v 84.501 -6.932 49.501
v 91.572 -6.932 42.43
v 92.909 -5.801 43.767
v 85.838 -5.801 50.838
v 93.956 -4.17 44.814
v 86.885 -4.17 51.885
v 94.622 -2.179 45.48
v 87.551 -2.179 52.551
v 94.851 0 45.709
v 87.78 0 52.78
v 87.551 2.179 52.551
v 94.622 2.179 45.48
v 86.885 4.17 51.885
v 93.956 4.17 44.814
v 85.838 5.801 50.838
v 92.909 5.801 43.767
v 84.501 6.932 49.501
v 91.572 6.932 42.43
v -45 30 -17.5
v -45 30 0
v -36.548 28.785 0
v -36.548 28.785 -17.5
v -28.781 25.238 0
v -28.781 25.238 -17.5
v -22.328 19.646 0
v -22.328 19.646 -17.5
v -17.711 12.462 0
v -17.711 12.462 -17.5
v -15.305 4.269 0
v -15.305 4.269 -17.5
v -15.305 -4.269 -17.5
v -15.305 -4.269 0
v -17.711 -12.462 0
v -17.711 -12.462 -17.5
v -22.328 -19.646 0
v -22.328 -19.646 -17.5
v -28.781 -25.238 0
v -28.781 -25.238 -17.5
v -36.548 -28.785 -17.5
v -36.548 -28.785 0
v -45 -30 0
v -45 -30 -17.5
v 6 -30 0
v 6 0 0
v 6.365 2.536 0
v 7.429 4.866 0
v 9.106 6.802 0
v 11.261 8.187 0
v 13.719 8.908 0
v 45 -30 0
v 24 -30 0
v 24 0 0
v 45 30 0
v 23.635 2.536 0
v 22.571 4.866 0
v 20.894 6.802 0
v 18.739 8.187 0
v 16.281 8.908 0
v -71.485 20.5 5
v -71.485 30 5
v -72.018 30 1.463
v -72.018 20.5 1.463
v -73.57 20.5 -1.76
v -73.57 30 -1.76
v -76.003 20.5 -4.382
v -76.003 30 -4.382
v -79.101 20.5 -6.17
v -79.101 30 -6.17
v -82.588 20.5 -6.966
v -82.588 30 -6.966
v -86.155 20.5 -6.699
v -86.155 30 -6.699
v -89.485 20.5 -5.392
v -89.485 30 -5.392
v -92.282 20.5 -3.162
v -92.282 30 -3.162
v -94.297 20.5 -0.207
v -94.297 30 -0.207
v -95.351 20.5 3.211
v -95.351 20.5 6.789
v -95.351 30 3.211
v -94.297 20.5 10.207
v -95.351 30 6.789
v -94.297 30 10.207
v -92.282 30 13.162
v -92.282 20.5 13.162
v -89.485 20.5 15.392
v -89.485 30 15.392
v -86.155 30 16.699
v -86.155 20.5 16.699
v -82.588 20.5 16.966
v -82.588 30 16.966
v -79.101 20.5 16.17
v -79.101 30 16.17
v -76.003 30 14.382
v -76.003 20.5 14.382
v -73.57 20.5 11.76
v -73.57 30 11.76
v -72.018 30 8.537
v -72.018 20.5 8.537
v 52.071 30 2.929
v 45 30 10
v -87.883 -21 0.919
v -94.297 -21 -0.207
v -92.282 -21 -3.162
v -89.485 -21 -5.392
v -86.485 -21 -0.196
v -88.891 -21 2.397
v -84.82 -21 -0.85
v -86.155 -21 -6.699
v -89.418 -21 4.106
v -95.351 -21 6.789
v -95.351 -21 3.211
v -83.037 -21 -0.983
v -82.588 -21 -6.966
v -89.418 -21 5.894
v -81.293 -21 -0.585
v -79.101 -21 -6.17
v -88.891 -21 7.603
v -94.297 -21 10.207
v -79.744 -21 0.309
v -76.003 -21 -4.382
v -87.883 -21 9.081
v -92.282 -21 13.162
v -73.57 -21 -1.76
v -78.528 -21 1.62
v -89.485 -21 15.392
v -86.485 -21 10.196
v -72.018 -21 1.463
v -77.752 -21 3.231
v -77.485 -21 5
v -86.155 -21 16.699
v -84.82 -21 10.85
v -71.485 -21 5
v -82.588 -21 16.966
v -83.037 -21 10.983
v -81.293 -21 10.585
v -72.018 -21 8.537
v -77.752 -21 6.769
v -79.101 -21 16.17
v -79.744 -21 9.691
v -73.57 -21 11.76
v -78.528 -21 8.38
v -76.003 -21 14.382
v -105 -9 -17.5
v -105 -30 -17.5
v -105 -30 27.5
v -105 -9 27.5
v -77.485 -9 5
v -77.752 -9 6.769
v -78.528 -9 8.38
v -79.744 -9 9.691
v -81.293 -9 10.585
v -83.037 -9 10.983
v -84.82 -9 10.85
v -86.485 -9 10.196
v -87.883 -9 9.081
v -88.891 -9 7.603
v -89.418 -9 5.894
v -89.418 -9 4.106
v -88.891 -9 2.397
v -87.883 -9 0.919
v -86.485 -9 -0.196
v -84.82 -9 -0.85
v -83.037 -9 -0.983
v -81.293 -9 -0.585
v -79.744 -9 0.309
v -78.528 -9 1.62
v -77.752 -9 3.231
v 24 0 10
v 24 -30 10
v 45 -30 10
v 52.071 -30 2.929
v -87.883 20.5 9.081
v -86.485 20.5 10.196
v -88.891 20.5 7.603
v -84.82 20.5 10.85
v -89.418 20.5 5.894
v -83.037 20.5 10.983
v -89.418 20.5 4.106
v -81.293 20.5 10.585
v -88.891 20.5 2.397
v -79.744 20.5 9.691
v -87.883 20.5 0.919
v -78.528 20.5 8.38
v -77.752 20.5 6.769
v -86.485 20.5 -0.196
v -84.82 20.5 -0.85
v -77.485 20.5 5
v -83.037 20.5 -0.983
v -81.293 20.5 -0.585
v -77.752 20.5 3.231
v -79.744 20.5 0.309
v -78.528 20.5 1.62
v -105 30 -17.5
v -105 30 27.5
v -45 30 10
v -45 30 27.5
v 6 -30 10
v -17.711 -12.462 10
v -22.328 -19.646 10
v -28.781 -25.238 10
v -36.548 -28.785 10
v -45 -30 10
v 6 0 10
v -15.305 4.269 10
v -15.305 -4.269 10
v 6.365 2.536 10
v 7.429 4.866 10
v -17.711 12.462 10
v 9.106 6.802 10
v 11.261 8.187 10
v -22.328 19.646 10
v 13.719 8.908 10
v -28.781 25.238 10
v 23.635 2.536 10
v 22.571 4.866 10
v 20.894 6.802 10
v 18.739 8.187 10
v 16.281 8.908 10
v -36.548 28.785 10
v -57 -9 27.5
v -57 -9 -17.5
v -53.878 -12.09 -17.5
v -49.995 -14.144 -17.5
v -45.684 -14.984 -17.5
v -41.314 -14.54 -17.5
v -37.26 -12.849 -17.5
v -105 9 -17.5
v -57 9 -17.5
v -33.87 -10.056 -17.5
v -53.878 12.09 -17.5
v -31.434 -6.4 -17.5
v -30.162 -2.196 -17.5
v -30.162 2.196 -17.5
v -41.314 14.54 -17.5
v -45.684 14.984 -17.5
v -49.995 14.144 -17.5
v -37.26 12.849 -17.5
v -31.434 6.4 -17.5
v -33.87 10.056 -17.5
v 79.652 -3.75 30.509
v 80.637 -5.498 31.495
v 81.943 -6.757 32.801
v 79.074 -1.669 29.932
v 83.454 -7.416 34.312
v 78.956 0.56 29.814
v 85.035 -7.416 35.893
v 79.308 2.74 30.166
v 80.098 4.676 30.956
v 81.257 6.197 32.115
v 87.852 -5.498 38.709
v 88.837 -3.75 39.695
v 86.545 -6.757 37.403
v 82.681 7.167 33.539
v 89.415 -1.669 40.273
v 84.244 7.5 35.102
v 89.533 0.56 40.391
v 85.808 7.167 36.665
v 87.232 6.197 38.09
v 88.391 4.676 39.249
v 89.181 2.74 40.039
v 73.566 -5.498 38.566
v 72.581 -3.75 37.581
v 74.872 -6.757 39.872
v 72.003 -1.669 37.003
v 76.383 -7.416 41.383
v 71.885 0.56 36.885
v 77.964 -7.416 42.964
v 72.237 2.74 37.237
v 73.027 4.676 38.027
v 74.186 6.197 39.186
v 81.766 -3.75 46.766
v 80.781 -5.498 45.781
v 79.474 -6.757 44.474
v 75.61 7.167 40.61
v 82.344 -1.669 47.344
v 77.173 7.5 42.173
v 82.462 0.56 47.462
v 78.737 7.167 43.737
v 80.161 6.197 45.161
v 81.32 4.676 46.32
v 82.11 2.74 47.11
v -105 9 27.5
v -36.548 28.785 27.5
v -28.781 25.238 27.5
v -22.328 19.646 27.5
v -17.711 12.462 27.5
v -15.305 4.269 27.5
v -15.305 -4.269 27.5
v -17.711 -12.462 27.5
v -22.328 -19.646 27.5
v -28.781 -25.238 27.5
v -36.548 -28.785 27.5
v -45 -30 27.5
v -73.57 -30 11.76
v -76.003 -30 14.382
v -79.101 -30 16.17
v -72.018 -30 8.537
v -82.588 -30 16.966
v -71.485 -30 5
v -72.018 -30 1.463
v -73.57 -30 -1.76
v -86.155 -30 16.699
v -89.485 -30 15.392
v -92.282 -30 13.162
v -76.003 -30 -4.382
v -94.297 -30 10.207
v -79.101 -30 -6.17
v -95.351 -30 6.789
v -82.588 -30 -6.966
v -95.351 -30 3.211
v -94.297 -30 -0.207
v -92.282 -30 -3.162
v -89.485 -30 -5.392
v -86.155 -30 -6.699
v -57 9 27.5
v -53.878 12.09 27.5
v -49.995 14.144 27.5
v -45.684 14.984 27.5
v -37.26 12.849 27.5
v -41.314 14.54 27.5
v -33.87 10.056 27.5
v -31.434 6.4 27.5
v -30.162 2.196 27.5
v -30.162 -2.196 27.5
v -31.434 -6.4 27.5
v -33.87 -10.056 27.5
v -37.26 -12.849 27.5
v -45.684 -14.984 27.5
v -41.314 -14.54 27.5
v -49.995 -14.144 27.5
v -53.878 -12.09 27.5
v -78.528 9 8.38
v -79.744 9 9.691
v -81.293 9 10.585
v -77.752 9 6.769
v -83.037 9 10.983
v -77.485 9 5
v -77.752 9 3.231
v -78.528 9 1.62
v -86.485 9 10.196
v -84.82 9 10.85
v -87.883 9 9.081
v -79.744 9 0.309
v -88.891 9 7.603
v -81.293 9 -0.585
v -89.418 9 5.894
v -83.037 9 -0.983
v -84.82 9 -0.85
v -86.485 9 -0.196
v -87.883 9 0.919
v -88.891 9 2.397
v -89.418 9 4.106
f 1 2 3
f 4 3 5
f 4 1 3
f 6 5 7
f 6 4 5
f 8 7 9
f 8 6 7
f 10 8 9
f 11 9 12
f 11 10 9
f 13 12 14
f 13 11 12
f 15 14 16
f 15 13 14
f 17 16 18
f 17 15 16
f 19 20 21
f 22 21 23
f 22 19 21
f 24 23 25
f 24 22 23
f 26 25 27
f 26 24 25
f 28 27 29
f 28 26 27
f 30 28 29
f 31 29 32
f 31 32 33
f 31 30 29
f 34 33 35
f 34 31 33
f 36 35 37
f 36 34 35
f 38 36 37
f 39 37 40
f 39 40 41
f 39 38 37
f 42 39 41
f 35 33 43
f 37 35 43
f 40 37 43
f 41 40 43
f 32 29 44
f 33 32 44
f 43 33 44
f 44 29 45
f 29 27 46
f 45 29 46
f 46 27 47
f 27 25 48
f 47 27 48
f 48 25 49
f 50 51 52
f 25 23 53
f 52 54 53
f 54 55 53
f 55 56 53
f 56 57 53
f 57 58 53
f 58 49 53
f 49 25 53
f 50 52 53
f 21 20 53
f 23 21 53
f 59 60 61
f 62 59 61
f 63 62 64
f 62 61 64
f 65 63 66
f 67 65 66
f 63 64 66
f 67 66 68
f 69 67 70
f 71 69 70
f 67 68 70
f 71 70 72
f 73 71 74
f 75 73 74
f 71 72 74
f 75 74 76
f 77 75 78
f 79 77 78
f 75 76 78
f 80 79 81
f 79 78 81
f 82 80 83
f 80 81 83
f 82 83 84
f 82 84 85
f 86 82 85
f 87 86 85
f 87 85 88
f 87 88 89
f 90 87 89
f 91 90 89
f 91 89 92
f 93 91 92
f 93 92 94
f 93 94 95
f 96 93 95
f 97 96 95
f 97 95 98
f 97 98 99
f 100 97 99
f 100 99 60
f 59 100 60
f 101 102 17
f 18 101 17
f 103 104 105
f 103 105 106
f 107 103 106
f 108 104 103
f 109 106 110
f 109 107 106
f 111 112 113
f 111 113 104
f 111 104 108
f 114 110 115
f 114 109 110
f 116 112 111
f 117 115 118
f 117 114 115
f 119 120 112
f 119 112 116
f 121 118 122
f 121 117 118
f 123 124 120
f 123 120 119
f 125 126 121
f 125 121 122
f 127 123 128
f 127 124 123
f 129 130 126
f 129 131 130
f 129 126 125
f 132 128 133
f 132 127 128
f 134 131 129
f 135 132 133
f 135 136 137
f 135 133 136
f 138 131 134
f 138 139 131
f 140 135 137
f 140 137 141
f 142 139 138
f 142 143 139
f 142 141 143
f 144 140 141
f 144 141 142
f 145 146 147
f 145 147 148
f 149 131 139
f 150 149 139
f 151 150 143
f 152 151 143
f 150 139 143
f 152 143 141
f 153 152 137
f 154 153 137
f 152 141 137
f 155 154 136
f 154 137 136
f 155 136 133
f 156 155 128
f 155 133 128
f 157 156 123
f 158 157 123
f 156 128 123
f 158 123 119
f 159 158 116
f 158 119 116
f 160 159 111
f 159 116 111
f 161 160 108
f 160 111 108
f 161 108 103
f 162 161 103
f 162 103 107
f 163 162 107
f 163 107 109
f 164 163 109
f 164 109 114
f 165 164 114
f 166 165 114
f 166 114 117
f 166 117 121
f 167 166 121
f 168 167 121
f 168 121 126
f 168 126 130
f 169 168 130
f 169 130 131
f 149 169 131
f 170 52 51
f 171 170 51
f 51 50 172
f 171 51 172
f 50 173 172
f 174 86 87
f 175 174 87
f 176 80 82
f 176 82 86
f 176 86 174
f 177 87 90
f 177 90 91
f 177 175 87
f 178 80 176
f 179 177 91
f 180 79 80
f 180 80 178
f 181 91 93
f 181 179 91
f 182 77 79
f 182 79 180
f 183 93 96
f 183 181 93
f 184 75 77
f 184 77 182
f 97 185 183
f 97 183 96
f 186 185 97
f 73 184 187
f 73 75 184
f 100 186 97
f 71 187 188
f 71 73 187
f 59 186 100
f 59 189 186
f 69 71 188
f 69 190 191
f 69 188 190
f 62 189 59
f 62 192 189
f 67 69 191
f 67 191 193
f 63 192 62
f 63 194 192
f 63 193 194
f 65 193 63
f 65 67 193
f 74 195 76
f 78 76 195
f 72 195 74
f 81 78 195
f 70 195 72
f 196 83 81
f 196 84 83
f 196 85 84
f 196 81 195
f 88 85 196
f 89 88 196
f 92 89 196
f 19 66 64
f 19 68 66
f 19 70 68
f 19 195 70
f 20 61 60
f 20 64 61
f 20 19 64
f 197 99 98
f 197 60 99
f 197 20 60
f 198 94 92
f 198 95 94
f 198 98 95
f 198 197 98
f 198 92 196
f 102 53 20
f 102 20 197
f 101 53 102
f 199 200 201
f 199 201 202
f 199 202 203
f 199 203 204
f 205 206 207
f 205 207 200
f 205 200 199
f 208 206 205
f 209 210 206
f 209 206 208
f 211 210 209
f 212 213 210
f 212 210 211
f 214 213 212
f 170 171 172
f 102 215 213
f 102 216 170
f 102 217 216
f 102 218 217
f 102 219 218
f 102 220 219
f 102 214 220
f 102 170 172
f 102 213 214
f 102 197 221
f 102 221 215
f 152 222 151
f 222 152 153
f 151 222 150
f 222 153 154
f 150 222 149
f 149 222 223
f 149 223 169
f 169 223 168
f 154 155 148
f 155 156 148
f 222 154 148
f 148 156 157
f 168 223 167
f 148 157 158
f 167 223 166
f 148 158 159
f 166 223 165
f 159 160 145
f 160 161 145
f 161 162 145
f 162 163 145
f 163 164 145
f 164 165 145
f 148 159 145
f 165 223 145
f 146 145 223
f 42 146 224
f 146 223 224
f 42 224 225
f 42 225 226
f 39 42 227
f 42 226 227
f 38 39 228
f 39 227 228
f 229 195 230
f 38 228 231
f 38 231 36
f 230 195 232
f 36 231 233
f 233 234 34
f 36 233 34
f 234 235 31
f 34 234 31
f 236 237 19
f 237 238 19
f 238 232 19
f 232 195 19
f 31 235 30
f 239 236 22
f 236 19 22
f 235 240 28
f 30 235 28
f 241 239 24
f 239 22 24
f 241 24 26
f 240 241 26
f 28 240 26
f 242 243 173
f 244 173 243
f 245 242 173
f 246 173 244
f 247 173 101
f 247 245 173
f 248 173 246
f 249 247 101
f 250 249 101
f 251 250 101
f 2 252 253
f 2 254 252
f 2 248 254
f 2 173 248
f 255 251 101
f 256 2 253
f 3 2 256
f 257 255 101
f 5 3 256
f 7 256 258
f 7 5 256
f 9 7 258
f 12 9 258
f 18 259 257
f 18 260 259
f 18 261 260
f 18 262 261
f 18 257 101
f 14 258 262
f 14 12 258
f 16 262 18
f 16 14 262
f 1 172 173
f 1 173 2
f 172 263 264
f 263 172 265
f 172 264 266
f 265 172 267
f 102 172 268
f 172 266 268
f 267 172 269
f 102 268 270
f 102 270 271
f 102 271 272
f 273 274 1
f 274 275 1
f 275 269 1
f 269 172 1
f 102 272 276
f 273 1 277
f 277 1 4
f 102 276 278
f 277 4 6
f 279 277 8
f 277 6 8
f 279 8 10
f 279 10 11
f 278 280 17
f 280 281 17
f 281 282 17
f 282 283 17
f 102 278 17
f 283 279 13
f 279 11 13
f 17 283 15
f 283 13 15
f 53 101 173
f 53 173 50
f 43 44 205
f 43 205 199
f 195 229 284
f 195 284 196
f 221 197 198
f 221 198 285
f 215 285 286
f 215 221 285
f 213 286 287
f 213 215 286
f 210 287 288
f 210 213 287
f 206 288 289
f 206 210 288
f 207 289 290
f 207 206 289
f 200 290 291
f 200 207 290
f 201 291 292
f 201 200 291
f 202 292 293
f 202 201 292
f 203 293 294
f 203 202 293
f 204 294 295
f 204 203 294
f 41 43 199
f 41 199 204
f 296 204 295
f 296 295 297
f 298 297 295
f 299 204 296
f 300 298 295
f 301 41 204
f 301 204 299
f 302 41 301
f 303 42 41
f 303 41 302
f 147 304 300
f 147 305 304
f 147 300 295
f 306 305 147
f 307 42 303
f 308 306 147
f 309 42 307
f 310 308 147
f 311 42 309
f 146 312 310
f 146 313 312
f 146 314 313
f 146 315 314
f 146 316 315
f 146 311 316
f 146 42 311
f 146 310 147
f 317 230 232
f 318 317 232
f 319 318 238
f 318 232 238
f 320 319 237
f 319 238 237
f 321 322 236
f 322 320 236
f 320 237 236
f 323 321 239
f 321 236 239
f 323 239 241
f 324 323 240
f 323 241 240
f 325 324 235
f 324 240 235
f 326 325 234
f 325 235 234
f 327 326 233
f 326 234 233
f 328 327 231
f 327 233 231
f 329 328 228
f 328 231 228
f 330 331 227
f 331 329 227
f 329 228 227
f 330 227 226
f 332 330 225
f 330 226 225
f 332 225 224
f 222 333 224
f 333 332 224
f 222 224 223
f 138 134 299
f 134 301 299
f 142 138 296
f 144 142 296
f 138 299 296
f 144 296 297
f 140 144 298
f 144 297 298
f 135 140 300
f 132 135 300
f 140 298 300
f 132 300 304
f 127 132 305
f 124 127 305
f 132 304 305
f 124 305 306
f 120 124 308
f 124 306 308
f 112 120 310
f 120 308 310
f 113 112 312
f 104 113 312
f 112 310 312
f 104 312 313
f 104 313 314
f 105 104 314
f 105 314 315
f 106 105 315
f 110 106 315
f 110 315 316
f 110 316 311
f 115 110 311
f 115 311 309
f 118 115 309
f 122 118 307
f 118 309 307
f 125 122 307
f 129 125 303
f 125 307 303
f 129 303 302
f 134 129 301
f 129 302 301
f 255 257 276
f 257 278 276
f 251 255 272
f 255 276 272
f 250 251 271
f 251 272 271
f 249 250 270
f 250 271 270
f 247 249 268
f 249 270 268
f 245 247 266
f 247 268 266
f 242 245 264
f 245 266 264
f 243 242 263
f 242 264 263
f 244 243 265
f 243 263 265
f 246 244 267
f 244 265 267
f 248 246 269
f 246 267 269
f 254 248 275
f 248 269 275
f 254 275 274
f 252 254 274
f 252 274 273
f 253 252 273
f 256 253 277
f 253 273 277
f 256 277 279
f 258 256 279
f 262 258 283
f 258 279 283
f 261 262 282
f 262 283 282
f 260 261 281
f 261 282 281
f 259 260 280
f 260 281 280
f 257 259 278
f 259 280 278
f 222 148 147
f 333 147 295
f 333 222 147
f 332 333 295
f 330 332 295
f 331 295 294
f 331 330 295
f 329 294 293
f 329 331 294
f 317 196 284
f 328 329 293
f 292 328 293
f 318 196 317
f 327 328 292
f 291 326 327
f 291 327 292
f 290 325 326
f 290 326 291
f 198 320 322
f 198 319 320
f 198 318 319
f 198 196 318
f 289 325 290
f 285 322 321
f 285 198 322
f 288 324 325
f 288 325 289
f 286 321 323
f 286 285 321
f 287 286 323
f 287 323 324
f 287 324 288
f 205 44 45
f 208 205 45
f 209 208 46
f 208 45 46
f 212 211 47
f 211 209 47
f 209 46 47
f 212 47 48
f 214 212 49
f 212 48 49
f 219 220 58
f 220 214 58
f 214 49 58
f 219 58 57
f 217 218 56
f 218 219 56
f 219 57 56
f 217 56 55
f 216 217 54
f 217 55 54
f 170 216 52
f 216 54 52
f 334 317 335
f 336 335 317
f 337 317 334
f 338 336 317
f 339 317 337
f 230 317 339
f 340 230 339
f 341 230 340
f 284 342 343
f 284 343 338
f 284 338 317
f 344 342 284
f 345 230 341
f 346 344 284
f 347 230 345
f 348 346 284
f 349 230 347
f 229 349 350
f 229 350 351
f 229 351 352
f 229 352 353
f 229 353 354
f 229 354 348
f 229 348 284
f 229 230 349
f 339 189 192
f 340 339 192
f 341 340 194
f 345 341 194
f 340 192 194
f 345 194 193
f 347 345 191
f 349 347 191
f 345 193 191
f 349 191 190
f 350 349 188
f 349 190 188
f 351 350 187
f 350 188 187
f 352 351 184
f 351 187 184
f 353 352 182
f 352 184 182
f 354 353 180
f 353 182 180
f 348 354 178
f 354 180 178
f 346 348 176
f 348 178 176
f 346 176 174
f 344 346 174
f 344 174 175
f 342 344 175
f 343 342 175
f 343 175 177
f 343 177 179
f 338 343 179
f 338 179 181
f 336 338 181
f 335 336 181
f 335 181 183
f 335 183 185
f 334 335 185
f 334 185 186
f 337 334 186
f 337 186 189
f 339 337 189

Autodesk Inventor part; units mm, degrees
sketch "Sketch1" plane through (0, 0, 0) normal (0, 0, 1) x (1, 0, 0)
  line L0 (-363.8821, 101.7163) -> (-138.7473, 103.6763) construction
  line L1 (-138.7473, 103.6763) -> (-137.081, -87.7242) construction
  line L2 (-137.081, -87.7242) -> (-362.2158, -89.6841) construction
  line L3 (-362.2158, -89.6841) -> (-363.8821, 101.7163) construction
  line L4 (-45, 30) -> (45, 30)
  line L5 (45, 30) -> (45, -30)
  line L6 (-45, -30) -> (-45, 30)
  line L7 (-45, 30) -> (45, -30) construction
  line L8 (45, 30) -> (-45, -30) construction
  arc A0 (24, 0) -> (6, 0) centre (15, 0) ccw
  line L9 (15, 0) -> (6, 0) construction
  line L10 (15, 0) -> (24, 0) construction
  line L11 (6, 0) -> (6, -30)
  line L12 (24, 0) -> (24, -30)
  line L13 (45, -30) -> (24, -30)
  line L14 (6, -30) -> (-45, -30)
  point P0 (0, 0)
  dimension "d9" = 90
  dimension "d10" = 60
  dimension "d12" = 9
  dimension "d13" = 180
  dimension "d14" = 30
  dimension "d15" = 30
extrude "Extrusion1" add sketch "Sketch1" along normal blind 10
ref_plane "Work Plane1" through (45, -30, 10) normal (0.7071, 0, -0.7071) x (0, 1, 0)
sketch "Sketch2" plane through (45, -30, 10) normal (0.7071, 0, -0.7071) x (0, 1, 0)
  line L0 (60, 0) -> (60, -63.6396) projected
  line L1 (0, 0) -> (60, 0) projected
  circle A0 centre (30, 45.5) radius 7.5
  line L2 (60, 0) -> (36.9322, 55.8626)
  line L3 (0, 0) -> (23.0678, 55.8626)
  arc A1 (36.9322, 55.8626) -> (23.0678, 55.8626) centre (30, 53) ccw
  point P0 (30, -38.8909)
  dimension "d19" = 15
  dimension "d20" = 45.5
  dimension "d22" = 7.5
extrude "Extrusion2" add sketch "Sketch2" along normal blind 10
sketch "Sketch3" plane through (0, 0, 0) normal (0, 1, 0) x (-1, 0, 0)
  point P0 (0, 0)
sketch "Sketch4" plane through (0, 0, 0) normal (0, 0, 1) x (1, 0, 0)
  point P0 (0, 0)
sketch "Sketch5" plane through (0, 0, 0) normal (0, 1, 0) x (-1, 0, 0)
  point P0 (0, 0)
ref_plane "Work Plane2" through (0, 30, 0) normal (0, 1, 0) x (-1, 0, 0)
ref_plane "Work Plane3" through (0, -30, 0) normal (0, 1, 0) x (-1, 0, 0)
sketch "Sketch6" plane through (0, 30, 0) normal (0, 1, 0) x (-1, 0, 0)
  line L0 (-45, 0) -> (-45, 10) projected
  line L1 (-45, 10) -> (-52.0711, 2.9289) projected
  line L2 (-45, 0) -> (-52.0711, 2.9289)
  line L3 (-52.0711, 2.9289) -> (-45, 10)
  line L4 (-45, 10) -> (-45, 0)
  point P0 (0, 0)
sketch "Sketch7" plane through (0, -30, 0) normal (0, 1, 0) x (-1, 0, 0)
  point P0 (0, 0)
sketch "Sketch8" plane through (0, -30, 0) normal (0, 1, 0) x (-1, 0, 0)
  line L0 (-45, 10) -> (-52.0711, 2.9289) projected
  line L1 (-52.0711, 2.9289) -> (-45, 10)
  line L2 (-45, 0) -> (-45, 10) projected
  line L3 (-45, 10) -> (-45, 0)
  line L4 (-45, 0) -> (-52.0711, 2.9289)
  point P0 (0, 0)
loft "Loft1" add profiles "Sketch8", "Sketch6"
sketch "Sketch9" plane through (0, 0, 10) normal (0, 0, 1) x (1, 0, 0)
  line L0 (45, 30) -> (-45, 30) projected
  line L1 (-45, 30) -> (-105, 30)
  line L2 (-45, 30) -> (-45, -30) projected
  line L3 (-45, -30) -> (-105, -30)
  arc A0 (-45, -30) -> (-45, 30) centre (-45, 0) ccw
  arc A1 (-57, -9) -> (-57, 9) centre (-45, 0) ccw
  line L4 (-57, 9) -> (-105, 9)
  line L5 (-57, -9) -> (-105, -9)
  line L6 (-105, -30) -> (-105, -9)
  line L7 (-105, 9) -> (-105, 30)
  point P0 (0, 0)
  dimension "d31" = 60
  dimension "d32" = 60
  dimension "d33" = 15
  dimension "d34" = 18
  dimension "d35" = 21
extrude "Extrusion3" add sketch "Sketch9" along normal blind 17.5 and the other way blind 27.5 contours L2 A1 L4 L7 L1 | A0 L2 A1 | L3 L6 L5 A1 L2
sketch "Sketch10" plane through (-105, 9, 27.5) normal (-1, 0, 0) x (0, 0, 1)
  line L0 (-45, 0) -> (-45, 21) projected
  line L1 (0, 21) -> (0, 0) projected
  point P0 (-27.5, -9)
  point P1 (-45, 10.5)
  dimension "d40" = 45
sketch "Sketch11" plane through (-45, 30, 0) normal (0, 1, 0) x (1, 0, 0)
  circle A0 centre (-38.4851, -5) radius 12
  line L0 (0, -27.5) -> (-60, -27.5) projected
  point P0 (45, 0)
  dimension "d42" = 24
extrude "Extrusion4" cut sketch "Sketch11" against normal blind 9.5
sketch "Sketch12" plane through (-83.4851, 20.5, 5) normal (0, 1, 0) x (1, 0, 0)
  circle A0 centre (0, 0) radius 12 projected
  circle A1 centre (0, 0) radius 6
  point P0 (83.4851, 5)
  dimension "d46" = 12
extrude "Extrusion5" cut sketch "Sketch12" against normal blind 12 contours A1
sketch "Sketch13" plane through (6, -30, 0) normal (0, -1, 0) x (1, 0, 0)
  circle A0 centre (-89.4851, 5) radius 12
  point P0 (-6, 0)
  dimension "d49" = 24
extrude "Extrusion6" cut sketch "Sketch13" against normal blind 9
sketch "Sketch14" plane through (-83.4851, -21, 5) normal (0, -1, 0) x (1, 0, 0)
  circle A0 centre (0, 0) radius 12 projected
  circle A1 centre (0, 0) radius 6
  point P0 (83.4851, -5)
  dimension "d52" = 12
extrude "Extrusion7" cut sketch "Sketch14" against normal blind 12 contours A1
sketch "Sketch15" plane through (0, 0, 10) normal (0, 0, 1) x (1, 0, 0)
  arc A0 (-45, -15) -> (-45, 15) centre (-45, 0) ccw projected
  line L0 (-45, 15) -> (-45, -15) projected
  line L1 (-45, -15) -> (-45, 15)
  arc A1 (-45, -15) -> (-45, 15) centre (-45, 0) ccw
  point P0 (0, 0)
extrude "Extrusion8" cut sketch "Sketch15" against normal through all
properties part number "cad@40"
